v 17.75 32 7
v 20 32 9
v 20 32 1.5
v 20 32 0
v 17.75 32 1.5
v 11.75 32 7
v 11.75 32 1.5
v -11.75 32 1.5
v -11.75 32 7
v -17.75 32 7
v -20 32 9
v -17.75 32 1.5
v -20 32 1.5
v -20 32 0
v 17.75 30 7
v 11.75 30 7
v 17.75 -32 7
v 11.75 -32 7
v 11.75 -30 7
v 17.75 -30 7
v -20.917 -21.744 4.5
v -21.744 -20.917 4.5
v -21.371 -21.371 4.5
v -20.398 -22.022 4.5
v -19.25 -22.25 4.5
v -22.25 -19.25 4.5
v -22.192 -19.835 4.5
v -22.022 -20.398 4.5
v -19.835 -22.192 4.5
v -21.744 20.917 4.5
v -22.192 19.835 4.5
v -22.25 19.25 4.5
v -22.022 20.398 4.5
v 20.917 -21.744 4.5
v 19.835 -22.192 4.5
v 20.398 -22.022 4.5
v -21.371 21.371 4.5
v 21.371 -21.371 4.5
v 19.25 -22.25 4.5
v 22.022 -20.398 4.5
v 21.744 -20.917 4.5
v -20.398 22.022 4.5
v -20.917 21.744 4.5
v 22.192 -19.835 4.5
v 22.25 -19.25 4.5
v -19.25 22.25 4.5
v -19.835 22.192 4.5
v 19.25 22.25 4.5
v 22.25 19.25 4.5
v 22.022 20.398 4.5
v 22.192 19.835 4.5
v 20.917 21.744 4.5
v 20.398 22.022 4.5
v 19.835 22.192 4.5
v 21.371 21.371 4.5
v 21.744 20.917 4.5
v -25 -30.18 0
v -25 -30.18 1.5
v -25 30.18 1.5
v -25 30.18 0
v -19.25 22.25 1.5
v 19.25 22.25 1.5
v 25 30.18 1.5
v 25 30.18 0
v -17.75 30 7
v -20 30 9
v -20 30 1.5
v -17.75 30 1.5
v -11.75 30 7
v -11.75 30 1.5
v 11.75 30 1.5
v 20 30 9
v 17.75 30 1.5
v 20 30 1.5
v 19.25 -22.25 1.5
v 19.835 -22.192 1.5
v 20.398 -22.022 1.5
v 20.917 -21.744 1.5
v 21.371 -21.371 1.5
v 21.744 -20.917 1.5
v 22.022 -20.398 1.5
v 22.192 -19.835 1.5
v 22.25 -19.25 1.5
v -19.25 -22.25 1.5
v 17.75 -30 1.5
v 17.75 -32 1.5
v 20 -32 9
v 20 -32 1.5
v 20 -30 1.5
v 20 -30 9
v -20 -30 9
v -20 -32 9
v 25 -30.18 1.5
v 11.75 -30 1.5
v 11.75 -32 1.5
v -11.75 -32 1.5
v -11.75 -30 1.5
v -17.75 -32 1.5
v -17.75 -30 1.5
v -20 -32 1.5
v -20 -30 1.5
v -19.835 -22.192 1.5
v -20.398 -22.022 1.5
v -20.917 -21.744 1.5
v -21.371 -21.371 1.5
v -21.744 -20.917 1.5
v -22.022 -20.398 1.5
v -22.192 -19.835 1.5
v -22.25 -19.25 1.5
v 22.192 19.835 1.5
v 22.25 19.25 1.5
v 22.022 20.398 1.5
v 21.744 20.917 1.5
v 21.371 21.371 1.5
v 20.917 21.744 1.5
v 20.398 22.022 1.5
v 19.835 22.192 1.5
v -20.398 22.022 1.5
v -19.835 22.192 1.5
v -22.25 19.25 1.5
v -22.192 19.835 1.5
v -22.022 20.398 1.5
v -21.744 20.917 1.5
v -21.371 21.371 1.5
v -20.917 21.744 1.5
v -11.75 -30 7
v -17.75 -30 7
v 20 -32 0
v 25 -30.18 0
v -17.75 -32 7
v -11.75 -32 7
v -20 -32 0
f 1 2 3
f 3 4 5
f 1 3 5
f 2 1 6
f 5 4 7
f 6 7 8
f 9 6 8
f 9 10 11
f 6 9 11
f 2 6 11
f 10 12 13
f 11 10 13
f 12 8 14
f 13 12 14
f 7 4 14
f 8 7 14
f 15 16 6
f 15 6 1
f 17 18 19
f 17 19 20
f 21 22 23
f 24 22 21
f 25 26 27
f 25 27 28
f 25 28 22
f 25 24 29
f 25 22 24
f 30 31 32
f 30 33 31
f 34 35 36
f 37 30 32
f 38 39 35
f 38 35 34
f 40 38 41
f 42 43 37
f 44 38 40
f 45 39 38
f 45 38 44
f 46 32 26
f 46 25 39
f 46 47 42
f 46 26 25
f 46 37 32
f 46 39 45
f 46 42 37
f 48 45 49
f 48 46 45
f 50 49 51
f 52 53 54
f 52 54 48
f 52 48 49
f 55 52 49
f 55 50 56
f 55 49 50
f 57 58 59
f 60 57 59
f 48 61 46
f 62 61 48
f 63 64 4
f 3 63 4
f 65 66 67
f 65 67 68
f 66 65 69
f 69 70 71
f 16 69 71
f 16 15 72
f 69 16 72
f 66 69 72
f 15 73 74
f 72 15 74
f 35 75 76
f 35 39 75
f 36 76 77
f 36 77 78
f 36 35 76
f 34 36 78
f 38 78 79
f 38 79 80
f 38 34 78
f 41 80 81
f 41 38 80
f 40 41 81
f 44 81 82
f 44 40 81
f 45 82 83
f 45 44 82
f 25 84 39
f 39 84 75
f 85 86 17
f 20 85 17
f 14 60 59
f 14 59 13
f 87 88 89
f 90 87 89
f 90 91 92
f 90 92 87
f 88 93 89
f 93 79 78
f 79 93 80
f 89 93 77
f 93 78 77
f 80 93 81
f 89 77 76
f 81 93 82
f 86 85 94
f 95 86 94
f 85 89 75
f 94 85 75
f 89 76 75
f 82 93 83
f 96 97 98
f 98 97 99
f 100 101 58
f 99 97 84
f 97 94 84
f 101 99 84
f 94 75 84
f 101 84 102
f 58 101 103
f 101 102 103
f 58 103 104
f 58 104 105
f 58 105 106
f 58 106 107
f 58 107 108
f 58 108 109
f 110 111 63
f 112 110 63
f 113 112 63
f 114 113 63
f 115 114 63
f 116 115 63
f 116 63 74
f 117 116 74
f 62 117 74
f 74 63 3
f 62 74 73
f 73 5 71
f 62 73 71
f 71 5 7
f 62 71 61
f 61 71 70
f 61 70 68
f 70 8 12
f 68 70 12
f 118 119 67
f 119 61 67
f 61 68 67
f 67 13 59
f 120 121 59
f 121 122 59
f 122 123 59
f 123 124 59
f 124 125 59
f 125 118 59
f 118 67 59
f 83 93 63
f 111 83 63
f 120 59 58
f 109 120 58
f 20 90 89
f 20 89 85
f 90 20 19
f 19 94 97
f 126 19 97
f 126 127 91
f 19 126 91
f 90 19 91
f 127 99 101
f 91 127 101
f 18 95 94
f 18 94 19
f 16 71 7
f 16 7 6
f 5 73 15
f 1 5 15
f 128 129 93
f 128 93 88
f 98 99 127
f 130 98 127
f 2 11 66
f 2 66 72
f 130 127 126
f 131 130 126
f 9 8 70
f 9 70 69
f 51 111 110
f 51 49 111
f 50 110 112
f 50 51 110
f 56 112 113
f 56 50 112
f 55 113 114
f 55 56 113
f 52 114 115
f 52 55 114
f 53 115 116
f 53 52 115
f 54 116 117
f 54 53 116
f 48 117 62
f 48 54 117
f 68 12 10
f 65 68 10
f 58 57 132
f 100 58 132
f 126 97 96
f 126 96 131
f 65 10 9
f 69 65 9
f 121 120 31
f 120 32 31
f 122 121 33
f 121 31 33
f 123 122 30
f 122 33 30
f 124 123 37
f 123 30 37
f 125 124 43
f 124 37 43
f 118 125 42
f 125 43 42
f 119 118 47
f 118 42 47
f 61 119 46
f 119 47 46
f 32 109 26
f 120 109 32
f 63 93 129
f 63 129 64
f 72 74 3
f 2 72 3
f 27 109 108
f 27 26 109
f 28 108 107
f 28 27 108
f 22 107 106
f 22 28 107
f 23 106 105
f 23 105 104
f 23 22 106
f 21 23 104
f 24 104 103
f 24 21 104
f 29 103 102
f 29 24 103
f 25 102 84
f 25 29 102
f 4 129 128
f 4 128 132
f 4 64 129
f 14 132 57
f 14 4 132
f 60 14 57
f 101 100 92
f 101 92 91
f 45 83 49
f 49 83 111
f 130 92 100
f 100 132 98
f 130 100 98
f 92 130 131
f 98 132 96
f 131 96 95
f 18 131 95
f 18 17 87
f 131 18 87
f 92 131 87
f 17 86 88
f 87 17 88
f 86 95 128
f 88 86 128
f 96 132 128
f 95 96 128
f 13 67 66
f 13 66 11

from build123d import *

# Parameters (mm, degrees)
F0_W         = 50
F0_H         = 60
F1_DEPTH     = 1.5
F2_W         = 20
F2_H         = 2
F3_DEPTH     = 9
F4_W         = 6
F4_H         = 5.5
F5_DEPTH     = 32
F6_W         = 44.5
F6_H         = 44.5
F7_DEPTH     = 4.5
F8_R         = 3
F9_T4_DEPTH  = 1.5
F9_T9_DEPTH  = 1.5
F9_T14_DEPTH = 1.5
F9_T19_DEPTH = 1.5


# Not quite as in the source:
# - a fillet or chamfer that OpenCascade refuses, or shapes differently, is made with other operations: its cross-section is extruded or revolved along the edge and cut away or added
# - a feature of the source that left no trace in its solid (it failed there, or was rolled back) is left out


with BuildPart() as f1:
    # F0 (on Top) → F1 (new body)
    with BuildSketch(Plane.XY):
        Rectangle(F0_W, F0_H)
    extrude(amount=F1_DEPTH)

    # F2 (on Top) → F3 (join)
    with BuildSketch(Plane.XY):
        with Locations((10, 31)):
            Rectangle(F2_W, F2_H)
        with Locations((-10, 31)):
            Rectangle(F2_W, F2_H)
        with Locations((-10, -31)):
            Rectangle(F2_W, F2_H)
        with Locations((10, -31)):
            Rectangle(F2_W, F2_H)
    extrude(amount=F3_DEPTH)

    # F4 (on Front) → F5 (cut, symmetric)
    with BuildSketch(Plane.XZ):
        with Locations((-14.75, 4.25)):
            Rectangle(F4_W, F4_H)
        with Locations((14.75, 4.25)):
            Rectangle(F4_W, F4_H)
    extrude(amount=F5_DEPTH, both=True, mode=Mode.SUBTRACT)

    # F6 (on Top) → F7 (join)
    with BuildSketch(Plane.XY):
        Rectangle(F6_W, F6_H)
    extrude(amount=F7_DEPTH)

    # F8
    f8_edges = [f1.edges().sort_by_distance(p)[0] for p in [
        (22.25, -22.25, 3),
        (-22.25, -22.25, 3),
        (-22.25, 22.25, 3),
        (22.25, 22.25, 3),
    ]]
    fillet(f8_edges, radius=F8_R)

    # F9: chamfer of 2 x 5.4949548389 on 4 edges, made by hand


with BuildPart() as f9_tool2:
    # F9_s3 → F9_t4 (new body)
    with BuildSketch(Plane.XY):
        Polygon((25.4949548389, 30), (20, 32), (20, 30), align=None)
    extrude(amount=F9_T4_DEPTH)

    split(bisect_by=Plane.YZ.offset(25), keep=Keep.BOTTOM)


with BuildPart() as f1_1:
    add(f1.part)

    # F9_t1: union F9_tool2
    add(f9_tool2.part)


with BuildPart() as f9_tool7:
    # F9_s8 → F9_t9 (new body)
    with BuildSketch(Plane.XY):
        Polygon((-25.4949548389, -30), (-20, -32), (-20, -30), align=None)
    extrude(amount=F9_T9_DEPTH)

    split(bisect_by=Plane.YZ.offset(-25), keep=Keep.TOP)


with BuildPart() as f1_2:
    add(f1_1.part)

    # F9_t6: union F9_tool7
    add(f9_tool7.part)


with BuildPart() as f9_tool12:
    # F9_s13 → F9_t14 (new body)
    with BuildSketch(Plane.XY):
        Polygon((-25.4949548389, 30), (-20, 32), (-20, 30), align=None)
    extrude(amount=F9_T14_DEPTH)

    split(bisect_by=Plane.YZ.offset(-25), keep=Keep.TOP)


with BuildPart() as f1_3:
    add(f1_2.part)

    # F9_t11: union F9_tool12
    add(f9_tool12.part)


with BuildPart() as f9_tool17:
    # F9_s18 → F9_t19 (new body)
    with BuildSketch(Plane.XY):
        Polygon((25.4949548389, -30), (20, -32), (20, -30), align=None)
    extrude(amount=F9_T19_DEPTH)

    split(bisect_by=Plane.YZ.offset(25), keep=Keep.BOTTOM)


with BuildPart() as f1_4:
    add(f1_3.part)

    # F9_t16: union F9_tool17
    add(f9_tool17.part)


solid = f1_4.part
